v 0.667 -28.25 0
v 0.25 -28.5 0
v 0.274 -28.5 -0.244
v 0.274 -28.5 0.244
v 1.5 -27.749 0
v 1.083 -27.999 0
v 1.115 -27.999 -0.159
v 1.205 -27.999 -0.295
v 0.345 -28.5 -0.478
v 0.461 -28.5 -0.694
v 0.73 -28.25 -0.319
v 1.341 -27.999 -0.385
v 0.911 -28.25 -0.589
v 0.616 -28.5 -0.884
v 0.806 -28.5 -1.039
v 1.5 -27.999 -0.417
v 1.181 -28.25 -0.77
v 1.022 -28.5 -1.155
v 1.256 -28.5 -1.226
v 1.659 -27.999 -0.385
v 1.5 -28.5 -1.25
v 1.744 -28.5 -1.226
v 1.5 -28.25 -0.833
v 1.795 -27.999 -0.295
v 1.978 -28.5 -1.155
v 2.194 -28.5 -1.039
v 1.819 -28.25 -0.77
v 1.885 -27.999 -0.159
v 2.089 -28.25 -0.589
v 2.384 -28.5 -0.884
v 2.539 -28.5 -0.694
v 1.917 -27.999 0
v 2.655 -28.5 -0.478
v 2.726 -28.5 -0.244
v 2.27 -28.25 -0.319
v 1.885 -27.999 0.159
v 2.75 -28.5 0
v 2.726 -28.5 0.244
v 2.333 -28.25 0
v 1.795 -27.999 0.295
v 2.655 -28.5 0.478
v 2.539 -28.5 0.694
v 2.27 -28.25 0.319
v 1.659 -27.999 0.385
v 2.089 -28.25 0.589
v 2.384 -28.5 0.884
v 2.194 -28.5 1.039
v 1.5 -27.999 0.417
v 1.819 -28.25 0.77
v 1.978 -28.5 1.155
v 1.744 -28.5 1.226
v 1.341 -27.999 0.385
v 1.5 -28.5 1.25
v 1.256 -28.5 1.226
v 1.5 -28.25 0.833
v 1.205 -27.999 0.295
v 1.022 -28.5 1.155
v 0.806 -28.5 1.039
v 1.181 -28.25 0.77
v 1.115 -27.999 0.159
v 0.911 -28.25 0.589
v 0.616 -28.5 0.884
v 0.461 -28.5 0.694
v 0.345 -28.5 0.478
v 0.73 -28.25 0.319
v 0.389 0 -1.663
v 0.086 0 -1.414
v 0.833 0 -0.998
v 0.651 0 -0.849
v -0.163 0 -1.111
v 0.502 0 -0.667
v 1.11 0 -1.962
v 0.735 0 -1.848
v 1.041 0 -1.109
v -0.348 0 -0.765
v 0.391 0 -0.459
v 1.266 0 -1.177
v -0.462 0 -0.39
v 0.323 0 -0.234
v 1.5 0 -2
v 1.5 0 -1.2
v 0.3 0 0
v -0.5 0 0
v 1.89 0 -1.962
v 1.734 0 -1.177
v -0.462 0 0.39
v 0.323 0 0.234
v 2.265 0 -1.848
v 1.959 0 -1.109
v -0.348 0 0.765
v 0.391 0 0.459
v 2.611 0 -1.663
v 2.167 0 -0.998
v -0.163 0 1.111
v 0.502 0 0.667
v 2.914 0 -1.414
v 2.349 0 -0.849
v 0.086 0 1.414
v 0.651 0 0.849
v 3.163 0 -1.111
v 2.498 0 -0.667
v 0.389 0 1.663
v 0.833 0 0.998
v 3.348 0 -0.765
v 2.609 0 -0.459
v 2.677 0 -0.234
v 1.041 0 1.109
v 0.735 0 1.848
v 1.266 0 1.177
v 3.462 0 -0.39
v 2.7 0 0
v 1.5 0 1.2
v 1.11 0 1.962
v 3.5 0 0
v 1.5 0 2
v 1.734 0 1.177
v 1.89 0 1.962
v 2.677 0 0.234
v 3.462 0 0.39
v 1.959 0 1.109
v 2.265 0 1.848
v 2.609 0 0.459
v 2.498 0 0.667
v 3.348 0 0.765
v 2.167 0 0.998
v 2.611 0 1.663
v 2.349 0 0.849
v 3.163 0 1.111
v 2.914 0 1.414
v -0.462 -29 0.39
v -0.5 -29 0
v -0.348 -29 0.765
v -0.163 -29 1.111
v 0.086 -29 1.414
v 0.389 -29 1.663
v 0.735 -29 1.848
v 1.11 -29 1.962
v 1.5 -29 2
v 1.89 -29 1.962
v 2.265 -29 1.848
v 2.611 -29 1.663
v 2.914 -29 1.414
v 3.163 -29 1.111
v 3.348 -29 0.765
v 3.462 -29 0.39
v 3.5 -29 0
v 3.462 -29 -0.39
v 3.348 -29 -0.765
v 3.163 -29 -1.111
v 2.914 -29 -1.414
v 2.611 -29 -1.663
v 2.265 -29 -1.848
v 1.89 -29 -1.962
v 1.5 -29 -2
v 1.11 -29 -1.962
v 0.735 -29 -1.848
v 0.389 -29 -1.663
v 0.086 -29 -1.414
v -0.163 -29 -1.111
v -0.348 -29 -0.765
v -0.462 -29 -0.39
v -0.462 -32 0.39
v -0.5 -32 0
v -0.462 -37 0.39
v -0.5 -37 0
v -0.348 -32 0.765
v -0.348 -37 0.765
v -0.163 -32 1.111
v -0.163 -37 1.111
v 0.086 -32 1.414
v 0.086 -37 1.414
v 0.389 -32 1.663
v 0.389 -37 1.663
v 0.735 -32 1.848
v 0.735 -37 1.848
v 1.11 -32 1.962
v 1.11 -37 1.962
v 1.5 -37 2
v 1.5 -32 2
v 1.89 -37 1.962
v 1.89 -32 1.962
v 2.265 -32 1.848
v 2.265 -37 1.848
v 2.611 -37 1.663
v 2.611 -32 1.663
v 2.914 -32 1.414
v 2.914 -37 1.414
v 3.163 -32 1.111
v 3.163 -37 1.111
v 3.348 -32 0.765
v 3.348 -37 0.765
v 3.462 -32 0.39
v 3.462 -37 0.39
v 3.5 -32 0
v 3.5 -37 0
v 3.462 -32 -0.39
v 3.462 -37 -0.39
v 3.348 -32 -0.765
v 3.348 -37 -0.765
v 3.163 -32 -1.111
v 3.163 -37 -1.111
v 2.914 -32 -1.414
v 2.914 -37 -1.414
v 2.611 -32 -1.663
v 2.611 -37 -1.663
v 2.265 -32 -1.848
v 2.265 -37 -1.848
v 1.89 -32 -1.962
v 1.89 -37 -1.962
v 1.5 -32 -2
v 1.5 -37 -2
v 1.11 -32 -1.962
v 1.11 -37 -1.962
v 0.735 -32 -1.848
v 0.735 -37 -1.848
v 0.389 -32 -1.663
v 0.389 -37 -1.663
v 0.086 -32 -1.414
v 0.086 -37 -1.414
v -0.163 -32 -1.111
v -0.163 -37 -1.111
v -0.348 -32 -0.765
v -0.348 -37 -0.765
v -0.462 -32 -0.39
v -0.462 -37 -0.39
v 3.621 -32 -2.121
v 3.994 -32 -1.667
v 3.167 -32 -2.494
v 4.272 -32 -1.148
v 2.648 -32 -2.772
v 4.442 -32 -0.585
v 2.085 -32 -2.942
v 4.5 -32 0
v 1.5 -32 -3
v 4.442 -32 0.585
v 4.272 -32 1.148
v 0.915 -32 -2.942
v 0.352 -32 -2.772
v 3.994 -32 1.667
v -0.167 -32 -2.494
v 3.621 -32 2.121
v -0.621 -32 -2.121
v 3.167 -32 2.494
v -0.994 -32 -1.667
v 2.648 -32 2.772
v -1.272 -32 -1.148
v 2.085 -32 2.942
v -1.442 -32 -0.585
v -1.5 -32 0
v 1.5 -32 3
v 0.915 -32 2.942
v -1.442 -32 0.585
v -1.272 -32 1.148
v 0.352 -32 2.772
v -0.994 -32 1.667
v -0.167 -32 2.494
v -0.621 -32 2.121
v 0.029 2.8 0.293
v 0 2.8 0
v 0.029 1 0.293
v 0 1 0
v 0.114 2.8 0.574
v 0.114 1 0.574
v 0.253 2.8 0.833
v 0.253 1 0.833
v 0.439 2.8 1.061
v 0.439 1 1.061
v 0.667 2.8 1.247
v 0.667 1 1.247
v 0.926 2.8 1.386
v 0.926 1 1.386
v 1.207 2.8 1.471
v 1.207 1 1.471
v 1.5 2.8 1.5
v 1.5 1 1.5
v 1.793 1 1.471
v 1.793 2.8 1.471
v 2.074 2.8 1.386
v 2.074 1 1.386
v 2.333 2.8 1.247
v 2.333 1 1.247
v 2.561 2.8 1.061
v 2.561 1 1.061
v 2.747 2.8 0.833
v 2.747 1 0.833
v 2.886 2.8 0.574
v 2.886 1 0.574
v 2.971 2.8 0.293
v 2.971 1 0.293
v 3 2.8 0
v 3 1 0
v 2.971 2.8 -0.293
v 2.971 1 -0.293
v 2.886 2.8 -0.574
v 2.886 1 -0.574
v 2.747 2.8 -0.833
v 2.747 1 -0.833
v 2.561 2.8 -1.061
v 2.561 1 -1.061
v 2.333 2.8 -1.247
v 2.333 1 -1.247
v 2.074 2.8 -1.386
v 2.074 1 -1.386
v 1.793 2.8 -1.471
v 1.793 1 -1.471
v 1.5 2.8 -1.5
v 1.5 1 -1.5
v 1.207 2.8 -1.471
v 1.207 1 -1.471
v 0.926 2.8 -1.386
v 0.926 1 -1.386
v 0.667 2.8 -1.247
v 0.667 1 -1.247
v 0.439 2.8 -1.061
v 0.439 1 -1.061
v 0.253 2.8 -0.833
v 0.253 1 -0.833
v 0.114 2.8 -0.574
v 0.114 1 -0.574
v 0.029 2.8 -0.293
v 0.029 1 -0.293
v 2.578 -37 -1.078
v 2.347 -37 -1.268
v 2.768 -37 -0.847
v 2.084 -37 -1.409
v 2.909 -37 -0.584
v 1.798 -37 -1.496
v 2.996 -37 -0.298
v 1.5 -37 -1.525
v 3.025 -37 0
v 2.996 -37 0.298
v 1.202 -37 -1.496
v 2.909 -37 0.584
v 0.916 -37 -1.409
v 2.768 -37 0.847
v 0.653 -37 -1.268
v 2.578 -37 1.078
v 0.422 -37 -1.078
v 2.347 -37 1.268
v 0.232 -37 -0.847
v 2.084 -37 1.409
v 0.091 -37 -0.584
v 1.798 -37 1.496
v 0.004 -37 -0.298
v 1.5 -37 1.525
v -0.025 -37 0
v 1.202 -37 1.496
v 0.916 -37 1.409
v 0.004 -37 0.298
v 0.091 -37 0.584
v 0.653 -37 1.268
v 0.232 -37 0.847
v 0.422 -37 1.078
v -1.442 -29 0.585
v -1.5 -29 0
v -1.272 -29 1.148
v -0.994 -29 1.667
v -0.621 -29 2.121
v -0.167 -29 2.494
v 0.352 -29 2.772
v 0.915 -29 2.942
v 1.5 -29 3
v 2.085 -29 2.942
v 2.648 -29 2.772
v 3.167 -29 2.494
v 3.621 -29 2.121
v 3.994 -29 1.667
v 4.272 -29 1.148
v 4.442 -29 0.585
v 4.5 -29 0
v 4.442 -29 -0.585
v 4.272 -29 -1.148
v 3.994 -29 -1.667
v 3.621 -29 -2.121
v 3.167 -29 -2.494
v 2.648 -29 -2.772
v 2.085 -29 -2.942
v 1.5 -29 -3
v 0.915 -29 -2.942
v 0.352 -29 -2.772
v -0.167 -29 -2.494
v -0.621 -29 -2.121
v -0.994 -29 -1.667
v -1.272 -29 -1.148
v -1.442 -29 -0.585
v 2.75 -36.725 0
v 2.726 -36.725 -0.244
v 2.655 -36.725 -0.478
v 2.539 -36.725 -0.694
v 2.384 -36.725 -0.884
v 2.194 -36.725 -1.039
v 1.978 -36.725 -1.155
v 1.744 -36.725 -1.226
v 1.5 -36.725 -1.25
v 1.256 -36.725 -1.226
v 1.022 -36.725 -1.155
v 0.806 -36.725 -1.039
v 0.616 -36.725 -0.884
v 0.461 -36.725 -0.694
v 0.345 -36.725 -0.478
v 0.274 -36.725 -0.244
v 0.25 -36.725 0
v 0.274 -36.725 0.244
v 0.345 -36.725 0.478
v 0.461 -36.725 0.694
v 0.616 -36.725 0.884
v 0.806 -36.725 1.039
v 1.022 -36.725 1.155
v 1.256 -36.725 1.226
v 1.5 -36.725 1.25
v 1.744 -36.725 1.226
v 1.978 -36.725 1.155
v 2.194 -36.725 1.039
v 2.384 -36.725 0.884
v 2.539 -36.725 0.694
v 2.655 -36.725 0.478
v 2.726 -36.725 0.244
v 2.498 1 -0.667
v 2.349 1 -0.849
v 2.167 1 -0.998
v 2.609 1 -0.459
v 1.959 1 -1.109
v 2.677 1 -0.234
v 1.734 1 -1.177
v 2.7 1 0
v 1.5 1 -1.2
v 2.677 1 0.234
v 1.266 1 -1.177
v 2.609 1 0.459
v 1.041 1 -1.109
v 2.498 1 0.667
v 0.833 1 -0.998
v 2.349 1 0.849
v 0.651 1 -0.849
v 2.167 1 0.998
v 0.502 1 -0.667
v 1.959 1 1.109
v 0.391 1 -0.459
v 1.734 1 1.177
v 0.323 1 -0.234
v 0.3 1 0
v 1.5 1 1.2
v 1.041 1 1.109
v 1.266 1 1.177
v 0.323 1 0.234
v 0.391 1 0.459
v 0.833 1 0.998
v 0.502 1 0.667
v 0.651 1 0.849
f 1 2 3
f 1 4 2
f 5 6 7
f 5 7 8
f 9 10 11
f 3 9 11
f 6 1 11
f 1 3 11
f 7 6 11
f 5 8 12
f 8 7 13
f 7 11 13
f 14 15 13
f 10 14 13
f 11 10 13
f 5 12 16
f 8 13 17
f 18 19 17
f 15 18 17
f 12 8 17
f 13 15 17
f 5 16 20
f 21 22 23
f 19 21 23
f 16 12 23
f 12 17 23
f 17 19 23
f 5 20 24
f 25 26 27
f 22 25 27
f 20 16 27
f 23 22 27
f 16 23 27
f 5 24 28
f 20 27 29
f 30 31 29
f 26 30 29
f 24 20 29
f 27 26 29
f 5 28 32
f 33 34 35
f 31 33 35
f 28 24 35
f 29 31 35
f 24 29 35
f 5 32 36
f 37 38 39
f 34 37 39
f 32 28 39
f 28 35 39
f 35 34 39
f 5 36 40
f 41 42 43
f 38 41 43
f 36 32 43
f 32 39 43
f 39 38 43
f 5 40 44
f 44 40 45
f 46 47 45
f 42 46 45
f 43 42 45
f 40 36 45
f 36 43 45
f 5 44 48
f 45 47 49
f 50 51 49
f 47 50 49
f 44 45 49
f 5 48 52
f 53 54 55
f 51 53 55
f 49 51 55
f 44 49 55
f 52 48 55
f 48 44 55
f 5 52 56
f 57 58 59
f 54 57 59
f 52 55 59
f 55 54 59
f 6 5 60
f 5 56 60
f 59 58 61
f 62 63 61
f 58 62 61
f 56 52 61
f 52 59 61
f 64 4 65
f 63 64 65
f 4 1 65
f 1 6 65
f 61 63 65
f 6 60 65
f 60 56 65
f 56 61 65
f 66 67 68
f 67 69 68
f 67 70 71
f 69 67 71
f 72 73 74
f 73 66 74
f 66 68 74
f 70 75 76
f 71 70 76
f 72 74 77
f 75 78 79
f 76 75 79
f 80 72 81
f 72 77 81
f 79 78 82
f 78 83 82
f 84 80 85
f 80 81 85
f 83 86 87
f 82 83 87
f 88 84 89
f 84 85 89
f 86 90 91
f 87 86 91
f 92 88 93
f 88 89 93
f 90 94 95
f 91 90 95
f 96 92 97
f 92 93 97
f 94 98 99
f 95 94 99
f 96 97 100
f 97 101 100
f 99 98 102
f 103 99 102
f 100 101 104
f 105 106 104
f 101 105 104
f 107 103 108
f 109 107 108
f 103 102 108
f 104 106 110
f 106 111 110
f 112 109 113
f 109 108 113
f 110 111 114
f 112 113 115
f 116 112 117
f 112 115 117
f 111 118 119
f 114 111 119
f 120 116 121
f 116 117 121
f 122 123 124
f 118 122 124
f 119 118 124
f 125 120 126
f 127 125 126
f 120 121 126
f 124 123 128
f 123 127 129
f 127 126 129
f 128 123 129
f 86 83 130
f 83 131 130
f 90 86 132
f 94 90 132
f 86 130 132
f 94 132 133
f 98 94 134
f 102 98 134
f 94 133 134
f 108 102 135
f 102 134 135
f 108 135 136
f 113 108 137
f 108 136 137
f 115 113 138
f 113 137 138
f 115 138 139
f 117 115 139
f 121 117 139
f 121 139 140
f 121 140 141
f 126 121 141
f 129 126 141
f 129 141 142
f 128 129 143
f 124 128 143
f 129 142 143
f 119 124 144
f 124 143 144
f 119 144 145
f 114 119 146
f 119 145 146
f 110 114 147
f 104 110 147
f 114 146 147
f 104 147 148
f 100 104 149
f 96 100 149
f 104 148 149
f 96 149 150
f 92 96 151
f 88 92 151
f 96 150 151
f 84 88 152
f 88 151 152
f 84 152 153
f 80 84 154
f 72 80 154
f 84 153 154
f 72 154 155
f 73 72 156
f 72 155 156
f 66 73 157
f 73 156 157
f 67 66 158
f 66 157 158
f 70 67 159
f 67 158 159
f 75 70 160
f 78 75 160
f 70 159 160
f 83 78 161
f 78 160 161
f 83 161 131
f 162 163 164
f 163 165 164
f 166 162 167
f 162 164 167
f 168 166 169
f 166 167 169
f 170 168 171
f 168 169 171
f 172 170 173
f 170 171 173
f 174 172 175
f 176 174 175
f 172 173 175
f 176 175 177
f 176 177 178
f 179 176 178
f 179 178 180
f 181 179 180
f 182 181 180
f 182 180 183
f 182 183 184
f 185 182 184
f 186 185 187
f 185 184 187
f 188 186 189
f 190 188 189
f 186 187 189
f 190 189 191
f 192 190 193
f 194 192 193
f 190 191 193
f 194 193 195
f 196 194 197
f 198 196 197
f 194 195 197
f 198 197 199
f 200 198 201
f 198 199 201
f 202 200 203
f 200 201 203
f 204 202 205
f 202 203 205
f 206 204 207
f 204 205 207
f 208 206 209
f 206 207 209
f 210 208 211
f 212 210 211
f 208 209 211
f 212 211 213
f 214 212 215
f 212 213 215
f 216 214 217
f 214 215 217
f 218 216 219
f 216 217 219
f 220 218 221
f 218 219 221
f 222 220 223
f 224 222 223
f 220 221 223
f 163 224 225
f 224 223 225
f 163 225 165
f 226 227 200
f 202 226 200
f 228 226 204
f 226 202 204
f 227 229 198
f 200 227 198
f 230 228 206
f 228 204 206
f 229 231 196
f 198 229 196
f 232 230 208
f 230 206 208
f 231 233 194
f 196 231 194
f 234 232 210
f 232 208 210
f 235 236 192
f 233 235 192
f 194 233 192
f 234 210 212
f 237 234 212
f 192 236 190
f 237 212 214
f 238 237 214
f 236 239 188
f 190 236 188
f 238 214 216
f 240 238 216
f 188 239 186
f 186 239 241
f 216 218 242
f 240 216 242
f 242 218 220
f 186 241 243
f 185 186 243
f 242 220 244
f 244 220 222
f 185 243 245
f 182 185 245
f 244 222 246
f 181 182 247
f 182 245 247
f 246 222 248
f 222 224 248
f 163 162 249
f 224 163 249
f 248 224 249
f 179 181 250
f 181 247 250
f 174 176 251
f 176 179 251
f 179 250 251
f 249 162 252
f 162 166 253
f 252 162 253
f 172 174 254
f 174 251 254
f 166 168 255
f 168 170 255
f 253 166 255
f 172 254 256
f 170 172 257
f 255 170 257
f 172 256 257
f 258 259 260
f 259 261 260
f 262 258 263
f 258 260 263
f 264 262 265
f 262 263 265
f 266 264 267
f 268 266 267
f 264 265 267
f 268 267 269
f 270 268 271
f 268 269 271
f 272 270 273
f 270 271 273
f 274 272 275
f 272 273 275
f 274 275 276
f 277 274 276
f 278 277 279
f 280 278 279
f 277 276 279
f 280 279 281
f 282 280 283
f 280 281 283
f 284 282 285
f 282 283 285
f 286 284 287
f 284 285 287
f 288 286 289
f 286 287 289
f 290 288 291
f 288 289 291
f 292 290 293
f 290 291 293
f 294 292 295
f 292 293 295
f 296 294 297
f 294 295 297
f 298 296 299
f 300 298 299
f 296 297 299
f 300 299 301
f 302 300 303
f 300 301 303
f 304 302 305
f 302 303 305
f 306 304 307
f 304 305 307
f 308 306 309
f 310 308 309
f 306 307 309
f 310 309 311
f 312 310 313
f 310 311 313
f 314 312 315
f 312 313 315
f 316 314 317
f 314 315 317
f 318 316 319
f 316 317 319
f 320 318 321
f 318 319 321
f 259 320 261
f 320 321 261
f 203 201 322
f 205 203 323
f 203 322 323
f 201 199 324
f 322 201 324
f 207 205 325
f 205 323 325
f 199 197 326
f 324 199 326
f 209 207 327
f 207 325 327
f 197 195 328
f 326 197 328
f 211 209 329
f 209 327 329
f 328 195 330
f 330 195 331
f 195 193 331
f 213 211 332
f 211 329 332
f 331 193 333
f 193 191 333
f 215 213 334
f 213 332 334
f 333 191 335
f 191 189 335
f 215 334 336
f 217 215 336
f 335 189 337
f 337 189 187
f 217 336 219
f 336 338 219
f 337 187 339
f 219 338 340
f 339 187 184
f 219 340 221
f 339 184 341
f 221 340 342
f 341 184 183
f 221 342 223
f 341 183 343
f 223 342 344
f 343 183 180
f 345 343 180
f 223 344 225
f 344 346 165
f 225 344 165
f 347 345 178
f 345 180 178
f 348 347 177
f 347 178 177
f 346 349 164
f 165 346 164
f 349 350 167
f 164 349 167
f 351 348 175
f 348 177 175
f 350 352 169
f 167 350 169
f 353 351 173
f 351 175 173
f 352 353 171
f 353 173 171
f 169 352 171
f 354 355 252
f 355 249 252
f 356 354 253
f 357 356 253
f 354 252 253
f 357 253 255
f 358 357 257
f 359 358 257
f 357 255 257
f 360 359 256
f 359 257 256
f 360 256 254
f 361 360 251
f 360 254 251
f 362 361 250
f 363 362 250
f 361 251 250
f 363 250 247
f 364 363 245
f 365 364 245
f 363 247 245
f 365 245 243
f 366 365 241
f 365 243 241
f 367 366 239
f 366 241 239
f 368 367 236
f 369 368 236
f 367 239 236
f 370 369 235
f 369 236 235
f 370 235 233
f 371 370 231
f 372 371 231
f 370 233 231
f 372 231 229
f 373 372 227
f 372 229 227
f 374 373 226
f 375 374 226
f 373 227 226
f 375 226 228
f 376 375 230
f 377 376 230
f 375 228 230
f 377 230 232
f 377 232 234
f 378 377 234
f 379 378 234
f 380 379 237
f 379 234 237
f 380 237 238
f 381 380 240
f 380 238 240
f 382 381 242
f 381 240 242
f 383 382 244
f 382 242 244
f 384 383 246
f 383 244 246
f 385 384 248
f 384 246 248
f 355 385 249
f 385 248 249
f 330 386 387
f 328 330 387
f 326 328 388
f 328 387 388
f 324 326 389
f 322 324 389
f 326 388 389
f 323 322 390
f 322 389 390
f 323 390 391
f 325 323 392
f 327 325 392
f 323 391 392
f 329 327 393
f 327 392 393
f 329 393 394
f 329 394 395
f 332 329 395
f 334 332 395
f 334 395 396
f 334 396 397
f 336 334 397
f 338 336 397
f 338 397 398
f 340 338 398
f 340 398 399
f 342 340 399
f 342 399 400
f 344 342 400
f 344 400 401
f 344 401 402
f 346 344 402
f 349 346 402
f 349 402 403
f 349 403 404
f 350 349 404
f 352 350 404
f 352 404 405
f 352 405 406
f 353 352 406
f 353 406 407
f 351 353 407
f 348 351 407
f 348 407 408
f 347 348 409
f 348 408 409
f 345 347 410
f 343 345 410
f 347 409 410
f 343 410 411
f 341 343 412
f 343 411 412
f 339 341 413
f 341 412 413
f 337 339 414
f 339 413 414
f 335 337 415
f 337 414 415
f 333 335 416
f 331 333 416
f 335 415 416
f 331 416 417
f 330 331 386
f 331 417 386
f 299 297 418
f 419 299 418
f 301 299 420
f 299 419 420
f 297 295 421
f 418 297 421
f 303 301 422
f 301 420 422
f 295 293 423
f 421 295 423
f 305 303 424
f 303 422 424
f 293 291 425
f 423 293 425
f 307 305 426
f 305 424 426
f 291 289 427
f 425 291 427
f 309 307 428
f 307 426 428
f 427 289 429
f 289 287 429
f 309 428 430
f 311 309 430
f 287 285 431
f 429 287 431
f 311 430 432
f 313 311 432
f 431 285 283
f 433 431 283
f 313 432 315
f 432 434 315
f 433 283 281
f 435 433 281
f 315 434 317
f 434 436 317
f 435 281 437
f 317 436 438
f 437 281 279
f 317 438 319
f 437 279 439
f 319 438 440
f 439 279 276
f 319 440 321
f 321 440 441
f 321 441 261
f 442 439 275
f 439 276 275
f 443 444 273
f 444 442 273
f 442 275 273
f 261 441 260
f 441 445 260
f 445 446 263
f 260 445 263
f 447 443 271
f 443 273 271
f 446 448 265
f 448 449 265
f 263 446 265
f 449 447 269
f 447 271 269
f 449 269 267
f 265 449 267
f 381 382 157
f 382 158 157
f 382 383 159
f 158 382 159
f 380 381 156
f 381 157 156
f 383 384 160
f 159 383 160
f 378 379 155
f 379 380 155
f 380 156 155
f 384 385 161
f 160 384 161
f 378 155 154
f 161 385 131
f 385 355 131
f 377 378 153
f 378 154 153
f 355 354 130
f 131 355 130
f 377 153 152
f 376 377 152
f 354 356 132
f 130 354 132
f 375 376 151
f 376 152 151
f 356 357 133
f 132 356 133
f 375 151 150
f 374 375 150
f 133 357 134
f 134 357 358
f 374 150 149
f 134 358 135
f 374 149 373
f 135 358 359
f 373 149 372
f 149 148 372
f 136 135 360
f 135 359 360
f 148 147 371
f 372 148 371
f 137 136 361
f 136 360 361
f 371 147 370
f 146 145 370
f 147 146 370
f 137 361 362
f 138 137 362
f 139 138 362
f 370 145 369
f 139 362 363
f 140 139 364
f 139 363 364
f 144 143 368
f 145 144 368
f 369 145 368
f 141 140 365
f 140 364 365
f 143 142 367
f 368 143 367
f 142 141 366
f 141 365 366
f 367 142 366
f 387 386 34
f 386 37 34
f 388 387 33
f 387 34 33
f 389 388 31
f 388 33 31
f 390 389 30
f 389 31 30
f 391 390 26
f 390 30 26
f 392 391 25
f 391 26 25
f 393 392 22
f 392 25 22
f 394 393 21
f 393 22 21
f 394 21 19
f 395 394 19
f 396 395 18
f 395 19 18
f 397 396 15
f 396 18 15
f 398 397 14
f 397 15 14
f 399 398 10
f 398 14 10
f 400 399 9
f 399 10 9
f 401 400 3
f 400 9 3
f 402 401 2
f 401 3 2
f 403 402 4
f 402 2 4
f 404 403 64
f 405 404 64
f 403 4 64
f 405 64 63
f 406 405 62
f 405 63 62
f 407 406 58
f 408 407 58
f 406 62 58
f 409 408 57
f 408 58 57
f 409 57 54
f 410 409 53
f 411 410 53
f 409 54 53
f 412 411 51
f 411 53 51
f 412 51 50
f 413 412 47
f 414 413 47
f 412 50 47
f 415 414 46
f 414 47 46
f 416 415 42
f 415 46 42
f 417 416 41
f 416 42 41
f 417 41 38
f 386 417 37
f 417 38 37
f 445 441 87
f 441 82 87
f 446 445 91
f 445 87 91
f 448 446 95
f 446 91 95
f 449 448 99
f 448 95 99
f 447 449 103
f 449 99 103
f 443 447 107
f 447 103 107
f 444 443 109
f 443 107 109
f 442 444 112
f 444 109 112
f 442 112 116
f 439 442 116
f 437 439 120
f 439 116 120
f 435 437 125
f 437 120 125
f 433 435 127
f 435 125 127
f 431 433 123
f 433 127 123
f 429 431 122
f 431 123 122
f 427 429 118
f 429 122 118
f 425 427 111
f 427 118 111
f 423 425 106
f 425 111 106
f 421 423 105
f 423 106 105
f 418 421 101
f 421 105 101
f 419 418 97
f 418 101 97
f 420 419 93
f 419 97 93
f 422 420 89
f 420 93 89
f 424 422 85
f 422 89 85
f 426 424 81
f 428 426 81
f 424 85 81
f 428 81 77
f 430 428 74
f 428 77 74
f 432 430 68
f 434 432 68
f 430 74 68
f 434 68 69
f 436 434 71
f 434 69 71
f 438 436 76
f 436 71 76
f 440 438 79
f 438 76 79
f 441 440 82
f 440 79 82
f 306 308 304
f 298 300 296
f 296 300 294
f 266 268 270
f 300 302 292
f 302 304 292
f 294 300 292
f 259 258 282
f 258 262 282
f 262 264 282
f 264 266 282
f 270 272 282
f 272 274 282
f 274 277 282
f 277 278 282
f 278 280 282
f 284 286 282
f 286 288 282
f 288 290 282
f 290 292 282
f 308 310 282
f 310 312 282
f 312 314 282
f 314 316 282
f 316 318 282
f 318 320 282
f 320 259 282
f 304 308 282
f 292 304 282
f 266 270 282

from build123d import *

# Parameters (mm, degrees)
TROU_TARAUD_M31_D           = 2.5
TROU_TARAUD_M31_DEPTH       = 8.5
TROU_TARAUD_M31_CSINK_D     = 3.05
TROU_TARAUD_M31_CSINK_ANGLE = 90
TROU_TARAUD_M31_TIP         = 0.751075774


with BuildPart() as part:
    # Esquisse1 → Révolution1 (revolve)
    with BuildSketch(Plane.XY):
        Polygon((0, 0), (-0.5, 0), (-0.5, -29), (-1.5, -29), (-1.5, -32), (-0.5, -32), (-0.5, -37), (1.5, -37), (1.5, 2.8), (0, 2.8), (0, 1), (0.3, 1), (0.3, 0), align=None)
    revolve(axis=Axis((1.5, -37, 0), (0, 1, 0)))

    # Trou taraudé M31
    with Locations(Plane(origin=(0, -37, 0), x_dir=(-1, 0, 0), z_dir=(0, -1, 0))):
        with Locations((-1.5, 0)):
            CounterSinkHole(TROU_TARAUD_M31_D / 2, TROU_TARAUD_M31_CSINK_D / 2, depth=TROU_TARAUD_M31_DEPTH, counter_sink_angle=TROU_TARAUD_M31_CSINK_ANGLE)
            with Locations((0, 0, -(TROU_TARAUD_M31_DEPTH + TROU_TARAUD_M31_TIP / 2))):  # 118° drill point
                Cone(0, TROU_TARAUD_M31_D / 2, TROU_TARAUD_M31_TIP, mode=Mode.SUBTRACT)


solid = part.part
